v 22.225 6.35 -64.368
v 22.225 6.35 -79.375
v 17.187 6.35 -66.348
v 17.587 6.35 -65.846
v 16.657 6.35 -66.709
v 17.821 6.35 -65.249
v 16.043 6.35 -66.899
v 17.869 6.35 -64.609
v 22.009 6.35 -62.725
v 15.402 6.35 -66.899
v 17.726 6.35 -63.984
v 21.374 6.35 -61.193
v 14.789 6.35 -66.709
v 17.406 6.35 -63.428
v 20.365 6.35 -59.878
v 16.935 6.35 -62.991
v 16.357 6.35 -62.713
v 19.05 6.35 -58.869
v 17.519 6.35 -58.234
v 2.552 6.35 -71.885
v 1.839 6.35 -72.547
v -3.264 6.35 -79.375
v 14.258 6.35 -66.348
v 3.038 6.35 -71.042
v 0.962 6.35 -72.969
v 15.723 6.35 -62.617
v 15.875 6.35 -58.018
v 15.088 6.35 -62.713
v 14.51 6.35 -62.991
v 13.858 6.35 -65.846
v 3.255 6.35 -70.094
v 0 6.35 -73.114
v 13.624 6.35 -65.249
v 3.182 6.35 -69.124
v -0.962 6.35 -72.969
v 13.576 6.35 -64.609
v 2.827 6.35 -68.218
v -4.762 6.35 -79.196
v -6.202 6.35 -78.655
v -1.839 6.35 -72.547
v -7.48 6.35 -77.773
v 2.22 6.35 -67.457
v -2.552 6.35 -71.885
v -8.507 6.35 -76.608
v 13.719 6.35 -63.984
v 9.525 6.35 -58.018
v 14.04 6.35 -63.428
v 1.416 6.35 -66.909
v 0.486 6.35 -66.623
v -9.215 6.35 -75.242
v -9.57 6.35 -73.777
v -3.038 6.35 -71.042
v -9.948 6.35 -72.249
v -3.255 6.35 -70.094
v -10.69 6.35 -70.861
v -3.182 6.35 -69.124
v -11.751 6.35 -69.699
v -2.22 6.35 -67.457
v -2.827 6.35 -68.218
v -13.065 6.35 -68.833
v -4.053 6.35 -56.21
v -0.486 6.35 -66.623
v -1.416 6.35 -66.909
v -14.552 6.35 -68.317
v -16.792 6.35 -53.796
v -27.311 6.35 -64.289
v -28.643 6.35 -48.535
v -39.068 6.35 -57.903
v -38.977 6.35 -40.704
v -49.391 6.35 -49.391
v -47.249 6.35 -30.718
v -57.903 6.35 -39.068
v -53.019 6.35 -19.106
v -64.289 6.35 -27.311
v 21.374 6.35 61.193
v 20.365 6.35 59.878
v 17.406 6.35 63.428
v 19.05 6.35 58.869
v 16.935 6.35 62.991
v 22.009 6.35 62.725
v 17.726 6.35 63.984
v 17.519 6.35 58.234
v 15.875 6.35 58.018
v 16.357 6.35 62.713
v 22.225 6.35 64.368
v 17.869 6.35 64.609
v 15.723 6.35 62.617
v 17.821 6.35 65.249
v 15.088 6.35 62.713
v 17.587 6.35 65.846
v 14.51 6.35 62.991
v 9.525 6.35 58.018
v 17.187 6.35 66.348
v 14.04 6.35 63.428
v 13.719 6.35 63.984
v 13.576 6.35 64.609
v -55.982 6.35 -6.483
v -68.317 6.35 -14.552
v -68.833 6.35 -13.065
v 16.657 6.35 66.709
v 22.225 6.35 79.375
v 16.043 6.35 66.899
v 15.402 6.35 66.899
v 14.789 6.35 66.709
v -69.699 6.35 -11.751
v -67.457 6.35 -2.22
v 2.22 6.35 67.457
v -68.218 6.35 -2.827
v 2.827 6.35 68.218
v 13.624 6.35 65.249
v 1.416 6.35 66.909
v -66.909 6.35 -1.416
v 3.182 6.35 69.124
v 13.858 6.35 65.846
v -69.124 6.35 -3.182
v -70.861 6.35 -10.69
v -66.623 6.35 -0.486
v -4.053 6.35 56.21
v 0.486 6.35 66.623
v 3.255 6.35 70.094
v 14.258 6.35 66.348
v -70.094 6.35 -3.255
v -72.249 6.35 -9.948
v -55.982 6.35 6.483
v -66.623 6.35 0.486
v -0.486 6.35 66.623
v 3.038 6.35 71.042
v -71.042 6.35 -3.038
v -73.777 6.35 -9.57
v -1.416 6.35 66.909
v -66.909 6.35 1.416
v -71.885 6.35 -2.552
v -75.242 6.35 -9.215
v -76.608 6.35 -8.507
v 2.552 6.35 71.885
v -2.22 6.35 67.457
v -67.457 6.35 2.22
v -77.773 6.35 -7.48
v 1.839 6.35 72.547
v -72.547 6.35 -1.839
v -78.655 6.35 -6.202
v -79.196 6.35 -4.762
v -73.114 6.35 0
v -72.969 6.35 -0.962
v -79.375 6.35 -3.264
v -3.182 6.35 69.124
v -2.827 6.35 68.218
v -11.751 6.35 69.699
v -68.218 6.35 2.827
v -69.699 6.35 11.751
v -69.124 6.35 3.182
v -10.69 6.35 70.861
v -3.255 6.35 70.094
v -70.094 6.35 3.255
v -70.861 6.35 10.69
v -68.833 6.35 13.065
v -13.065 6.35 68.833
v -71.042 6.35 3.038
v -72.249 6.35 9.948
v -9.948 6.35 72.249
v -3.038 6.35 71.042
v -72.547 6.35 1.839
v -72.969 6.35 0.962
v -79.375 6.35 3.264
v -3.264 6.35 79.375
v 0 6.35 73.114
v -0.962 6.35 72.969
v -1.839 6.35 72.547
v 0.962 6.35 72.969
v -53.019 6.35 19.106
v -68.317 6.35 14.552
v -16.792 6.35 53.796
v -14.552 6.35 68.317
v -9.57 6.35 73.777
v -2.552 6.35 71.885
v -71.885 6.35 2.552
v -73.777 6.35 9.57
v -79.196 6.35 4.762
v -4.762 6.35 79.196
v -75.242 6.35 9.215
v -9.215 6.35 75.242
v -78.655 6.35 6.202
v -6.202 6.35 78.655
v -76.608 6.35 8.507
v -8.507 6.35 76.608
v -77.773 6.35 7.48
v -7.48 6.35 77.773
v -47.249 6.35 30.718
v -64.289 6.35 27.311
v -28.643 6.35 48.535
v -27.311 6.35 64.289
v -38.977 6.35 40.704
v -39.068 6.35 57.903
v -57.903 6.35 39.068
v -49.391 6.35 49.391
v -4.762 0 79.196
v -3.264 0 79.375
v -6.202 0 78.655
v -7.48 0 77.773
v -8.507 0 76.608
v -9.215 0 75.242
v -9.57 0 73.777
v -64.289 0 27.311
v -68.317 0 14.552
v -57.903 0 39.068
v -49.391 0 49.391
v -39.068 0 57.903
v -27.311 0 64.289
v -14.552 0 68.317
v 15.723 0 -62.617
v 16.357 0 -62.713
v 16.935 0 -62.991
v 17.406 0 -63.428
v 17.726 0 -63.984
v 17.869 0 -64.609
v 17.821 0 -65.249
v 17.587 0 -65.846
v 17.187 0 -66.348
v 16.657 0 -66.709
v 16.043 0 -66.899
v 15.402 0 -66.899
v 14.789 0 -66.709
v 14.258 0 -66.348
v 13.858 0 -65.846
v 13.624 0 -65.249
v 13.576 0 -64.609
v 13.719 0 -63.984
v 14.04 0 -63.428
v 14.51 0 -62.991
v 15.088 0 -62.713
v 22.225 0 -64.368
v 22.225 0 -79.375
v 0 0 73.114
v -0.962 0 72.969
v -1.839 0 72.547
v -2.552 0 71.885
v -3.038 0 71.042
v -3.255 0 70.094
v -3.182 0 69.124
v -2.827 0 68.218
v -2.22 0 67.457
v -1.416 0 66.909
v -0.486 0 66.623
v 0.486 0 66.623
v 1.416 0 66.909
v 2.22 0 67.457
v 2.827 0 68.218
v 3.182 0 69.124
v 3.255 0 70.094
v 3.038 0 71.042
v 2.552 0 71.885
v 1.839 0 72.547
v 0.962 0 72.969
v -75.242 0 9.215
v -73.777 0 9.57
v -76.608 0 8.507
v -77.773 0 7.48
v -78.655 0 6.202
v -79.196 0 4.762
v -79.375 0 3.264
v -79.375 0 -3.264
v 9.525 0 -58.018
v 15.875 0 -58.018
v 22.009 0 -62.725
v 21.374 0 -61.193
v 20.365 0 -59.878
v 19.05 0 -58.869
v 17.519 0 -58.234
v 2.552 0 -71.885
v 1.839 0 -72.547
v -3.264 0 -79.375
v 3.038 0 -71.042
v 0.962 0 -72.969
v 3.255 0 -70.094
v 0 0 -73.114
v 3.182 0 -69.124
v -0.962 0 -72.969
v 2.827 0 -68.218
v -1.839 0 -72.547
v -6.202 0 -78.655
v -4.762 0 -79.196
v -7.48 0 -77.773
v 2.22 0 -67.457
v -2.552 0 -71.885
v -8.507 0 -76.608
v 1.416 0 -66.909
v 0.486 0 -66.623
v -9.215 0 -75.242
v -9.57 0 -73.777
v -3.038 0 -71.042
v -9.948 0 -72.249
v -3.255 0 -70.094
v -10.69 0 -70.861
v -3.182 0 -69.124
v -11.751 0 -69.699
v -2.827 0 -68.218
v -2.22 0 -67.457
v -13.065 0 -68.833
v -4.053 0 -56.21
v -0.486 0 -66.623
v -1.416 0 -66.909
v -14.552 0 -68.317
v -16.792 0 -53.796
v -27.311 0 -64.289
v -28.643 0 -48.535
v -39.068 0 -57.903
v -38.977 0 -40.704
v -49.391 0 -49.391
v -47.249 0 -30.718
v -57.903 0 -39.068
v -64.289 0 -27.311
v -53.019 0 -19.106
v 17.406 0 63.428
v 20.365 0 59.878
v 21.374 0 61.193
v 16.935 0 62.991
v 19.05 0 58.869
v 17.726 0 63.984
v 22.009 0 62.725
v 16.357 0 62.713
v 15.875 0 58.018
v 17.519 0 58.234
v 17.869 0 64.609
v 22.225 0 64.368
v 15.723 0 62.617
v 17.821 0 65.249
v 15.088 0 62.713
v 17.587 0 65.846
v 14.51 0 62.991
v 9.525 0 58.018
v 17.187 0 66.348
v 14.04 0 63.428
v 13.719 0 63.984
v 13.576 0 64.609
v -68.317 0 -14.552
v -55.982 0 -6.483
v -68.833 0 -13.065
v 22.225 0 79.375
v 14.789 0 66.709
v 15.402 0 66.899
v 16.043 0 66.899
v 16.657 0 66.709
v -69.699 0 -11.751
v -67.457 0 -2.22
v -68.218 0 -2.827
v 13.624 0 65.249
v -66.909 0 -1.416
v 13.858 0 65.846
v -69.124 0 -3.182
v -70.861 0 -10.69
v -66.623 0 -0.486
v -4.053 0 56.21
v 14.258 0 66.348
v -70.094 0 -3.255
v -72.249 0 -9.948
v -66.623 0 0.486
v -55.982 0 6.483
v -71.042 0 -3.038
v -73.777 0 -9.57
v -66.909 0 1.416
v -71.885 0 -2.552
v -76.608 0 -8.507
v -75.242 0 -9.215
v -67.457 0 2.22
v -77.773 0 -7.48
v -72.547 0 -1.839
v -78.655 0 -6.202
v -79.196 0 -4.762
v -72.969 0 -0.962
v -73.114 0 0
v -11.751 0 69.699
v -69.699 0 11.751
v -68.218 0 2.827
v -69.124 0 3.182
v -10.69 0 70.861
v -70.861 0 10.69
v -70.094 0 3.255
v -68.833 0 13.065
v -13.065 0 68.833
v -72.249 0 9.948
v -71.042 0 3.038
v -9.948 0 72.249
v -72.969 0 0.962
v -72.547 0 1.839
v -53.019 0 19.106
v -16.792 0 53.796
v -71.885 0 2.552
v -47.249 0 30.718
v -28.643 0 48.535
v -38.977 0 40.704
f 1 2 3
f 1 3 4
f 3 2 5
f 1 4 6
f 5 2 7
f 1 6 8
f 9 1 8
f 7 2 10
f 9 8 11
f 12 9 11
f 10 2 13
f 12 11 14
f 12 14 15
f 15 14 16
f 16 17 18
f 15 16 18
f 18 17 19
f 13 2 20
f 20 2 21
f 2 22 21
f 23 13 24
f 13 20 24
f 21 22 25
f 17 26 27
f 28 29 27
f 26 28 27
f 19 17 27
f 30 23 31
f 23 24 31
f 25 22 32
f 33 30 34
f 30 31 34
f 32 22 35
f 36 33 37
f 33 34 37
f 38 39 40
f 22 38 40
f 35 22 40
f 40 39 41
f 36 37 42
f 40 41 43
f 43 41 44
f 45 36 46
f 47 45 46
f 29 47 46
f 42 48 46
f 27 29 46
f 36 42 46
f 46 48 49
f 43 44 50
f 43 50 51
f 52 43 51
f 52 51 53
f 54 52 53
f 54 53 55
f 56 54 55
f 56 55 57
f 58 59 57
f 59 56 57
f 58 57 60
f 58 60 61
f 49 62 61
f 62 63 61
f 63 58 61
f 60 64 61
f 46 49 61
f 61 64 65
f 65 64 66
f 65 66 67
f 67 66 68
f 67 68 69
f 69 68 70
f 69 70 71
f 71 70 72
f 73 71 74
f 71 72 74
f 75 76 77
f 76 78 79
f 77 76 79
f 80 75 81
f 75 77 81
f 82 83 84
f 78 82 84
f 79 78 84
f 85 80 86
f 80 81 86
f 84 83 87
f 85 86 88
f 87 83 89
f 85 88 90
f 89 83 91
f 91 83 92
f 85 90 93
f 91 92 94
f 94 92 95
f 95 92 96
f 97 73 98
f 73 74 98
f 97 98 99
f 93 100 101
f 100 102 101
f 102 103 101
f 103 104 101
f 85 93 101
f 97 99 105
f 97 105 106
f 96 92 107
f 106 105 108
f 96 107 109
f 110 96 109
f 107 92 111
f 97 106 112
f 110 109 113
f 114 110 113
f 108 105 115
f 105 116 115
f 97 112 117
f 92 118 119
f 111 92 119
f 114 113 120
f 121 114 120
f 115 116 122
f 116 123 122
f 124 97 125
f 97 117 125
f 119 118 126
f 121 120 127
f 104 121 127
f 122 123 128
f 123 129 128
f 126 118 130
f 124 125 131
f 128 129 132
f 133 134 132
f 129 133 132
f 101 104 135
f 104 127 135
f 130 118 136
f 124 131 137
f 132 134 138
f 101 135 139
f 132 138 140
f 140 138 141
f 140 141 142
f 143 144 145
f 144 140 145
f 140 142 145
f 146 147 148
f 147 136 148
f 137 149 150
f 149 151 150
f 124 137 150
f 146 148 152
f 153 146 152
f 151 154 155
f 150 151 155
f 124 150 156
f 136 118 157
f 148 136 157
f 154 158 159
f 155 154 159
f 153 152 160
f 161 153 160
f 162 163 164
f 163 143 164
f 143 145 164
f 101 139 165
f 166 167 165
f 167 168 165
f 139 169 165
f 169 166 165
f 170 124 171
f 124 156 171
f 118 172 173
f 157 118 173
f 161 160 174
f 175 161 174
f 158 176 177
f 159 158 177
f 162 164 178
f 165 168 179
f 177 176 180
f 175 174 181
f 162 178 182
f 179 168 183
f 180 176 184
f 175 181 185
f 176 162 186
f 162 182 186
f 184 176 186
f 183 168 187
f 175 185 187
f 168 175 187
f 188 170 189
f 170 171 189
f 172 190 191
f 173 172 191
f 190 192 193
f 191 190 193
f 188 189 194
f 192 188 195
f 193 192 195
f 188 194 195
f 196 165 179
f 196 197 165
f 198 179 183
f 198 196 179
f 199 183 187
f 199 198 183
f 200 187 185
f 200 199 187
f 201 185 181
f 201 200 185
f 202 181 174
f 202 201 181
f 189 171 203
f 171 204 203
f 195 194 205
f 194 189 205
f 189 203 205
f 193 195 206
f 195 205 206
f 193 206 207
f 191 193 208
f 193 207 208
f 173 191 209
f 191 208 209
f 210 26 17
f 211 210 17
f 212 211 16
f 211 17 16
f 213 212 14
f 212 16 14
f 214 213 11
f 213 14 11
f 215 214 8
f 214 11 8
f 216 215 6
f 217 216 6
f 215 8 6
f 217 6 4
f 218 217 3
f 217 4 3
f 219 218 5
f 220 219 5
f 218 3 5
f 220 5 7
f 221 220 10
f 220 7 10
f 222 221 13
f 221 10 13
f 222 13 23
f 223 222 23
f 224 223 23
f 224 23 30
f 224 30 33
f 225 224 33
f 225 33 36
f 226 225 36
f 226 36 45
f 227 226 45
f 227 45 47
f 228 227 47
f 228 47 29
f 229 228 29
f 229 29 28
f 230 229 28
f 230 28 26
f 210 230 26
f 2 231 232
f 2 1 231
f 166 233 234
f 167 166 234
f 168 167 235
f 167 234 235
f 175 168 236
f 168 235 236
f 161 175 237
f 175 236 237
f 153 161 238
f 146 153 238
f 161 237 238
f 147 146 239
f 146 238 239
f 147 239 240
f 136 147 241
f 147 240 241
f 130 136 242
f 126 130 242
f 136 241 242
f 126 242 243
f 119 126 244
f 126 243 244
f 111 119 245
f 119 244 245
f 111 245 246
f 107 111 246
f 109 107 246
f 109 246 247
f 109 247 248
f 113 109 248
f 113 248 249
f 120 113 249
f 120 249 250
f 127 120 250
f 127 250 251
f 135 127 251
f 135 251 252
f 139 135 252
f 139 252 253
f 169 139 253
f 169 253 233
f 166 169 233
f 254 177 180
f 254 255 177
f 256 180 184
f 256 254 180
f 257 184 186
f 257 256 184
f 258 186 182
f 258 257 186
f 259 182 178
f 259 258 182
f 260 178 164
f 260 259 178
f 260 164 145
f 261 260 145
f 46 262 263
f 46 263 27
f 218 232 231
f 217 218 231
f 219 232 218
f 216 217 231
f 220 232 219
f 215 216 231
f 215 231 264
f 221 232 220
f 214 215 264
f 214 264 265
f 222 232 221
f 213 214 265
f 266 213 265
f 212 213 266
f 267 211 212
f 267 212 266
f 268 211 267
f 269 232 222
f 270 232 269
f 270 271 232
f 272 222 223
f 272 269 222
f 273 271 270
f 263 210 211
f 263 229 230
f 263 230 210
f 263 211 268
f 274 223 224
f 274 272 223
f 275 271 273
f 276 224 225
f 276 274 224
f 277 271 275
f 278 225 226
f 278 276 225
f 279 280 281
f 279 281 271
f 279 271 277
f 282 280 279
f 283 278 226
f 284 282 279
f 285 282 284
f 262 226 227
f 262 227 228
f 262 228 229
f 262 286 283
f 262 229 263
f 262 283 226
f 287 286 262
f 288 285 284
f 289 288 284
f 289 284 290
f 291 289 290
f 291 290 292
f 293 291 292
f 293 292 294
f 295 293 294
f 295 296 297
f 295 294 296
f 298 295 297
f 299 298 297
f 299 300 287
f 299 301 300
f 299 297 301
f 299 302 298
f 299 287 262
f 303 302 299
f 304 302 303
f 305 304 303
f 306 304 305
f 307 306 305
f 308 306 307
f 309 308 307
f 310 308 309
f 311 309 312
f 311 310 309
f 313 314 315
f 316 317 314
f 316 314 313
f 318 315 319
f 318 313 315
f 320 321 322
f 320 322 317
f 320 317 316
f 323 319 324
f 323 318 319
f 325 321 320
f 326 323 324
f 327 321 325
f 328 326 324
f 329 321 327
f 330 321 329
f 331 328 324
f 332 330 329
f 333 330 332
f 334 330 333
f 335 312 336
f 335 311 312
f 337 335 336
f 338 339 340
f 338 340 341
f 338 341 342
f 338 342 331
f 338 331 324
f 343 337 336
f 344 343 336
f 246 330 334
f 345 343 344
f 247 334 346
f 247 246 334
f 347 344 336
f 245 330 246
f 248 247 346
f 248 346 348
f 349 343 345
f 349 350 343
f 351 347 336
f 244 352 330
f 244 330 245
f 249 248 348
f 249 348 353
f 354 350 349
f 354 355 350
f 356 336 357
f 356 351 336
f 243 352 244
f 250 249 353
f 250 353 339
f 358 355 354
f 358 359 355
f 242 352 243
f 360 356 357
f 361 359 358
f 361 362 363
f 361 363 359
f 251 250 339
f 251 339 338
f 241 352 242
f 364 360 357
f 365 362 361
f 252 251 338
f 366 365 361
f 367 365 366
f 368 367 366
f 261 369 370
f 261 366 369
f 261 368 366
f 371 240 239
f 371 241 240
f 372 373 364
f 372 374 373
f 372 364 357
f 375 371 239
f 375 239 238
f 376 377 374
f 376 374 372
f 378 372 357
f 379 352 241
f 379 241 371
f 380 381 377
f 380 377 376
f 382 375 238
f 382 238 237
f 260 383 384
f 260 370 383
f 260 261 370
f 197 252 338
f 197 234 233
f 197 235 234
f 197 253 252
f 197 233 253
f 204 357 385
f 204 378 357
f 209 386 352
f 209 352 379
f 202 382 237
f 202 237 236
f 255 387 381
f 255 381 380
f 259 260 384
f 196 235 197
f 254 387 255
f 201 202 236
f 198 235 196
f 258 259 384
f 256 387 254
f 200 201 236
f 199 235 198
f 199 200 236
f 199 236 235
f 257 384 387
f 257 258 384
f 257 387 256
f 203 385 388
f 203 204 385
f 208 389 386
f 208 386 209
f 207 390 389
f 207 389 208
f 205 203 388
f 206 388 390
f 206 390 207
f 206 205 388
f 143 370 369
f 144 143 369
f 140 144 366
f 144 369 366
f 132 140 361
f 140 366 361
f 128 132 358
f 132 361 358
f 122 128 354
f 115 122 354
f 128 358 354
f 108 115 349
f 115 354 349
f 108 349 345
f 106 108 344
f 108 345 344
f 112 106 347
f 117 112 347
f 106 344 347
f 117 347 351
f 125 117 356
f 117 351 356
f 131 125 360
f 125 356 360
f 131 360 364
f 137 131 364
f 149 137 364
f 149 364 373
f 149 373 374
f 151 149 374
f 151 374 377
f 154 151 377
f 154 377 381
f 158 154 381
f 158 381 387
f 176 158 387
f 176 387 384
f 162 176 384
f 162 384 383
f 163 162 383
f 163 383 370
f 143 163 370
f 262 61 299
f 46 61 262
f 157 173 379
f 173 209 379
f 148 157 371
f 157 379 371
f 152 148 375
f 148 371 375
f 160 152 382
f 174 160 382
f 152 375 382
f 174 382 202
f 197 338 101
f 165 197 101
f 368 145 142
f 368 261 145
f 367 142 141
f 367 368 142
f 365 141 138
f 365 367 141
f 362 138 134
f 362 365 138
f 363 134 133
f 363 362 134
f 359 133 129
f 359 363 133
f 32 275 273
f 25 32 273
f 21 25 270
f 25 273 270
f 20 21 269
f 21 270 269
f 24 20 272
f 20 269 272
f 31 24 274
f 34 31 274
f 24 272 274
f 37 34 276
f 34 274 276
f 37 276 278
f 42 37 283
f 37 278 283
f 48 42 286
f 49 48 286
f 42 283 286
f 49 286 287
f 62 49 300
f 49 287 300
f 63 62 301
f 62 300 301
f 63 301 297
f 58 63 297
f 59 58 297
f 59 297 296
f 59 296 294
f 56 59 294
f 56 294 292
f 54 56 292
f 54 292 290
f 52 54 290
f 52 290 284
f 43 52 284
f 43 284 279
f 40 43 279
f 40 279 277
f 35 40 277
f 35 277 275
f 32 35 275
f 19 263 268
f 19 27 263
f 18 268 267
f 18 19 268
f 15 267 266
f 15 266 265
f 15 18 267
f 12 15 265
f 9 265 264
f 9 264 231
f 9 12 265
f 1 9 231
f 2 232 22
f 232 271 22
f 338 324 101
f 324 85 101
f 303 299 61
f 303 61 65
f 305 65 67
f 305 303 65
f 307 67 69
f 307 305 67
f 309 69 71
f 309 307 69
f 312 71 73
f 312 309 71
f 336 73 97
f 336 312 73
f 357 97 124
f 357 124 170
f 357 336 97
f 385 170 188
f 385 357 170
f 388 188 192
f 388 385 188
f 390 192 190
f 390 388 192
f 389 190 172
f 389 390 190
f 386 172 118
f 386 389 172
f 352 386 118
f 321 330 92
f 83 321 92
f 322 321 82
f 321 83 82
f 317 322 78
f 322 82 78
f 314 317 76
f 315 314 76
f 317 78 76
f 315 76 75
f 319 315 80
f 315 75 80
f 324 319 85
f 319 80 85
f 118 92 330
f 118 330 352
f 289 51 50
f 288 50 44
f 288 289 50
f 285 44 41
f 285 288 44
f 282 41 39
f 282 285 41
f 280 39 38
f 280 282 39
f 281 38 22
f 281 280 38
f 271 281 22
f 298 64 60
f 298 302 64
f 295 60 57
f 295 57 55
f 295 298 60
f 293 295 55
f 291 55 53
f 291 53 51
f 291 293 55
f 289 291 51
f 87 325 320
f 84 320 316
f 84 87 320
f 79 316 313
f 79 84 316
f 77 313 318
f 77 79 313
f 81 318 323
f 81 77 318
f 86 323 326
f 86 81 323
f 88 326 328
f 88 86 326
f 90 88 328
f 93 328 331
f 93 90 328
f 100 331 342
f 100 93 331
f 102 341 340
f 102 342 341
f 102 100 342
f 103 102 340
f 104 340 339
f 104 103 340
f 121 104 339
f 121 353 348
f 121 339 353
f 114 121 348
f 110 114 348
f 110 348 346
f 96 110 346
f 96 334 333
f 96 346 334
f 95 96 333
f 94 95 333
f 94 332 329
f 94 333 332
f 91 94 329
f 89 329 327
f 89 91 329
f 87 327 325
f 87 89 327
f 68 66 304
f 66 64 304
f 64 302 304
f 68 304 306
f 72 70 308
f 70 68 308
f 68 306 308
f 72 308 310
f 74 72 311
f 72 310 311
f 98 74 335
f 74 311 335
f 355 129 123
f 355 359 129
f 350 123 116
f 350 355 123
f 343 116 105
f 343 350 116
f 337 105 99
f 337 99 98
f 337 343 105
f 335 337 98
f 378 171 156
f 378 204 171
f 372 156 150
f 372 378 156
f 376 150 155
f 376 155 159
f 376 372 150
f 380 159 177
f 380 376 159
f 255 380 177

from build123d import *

# Parameters (mm, degrees)
SKETCH1_R                = 69.85
SKETCH1_R_2              = 56.35625
BOSS_EXTRUDE1_DEPTH      = 6.35
SKETCH5_W                = 19.05
SKETCH5_H                = 15.875
BOSS_EXTRUDE2_DEPTH      = 6.35
FILLET1_R                = 6.35
CIRPATTERN2_COUNT        = 3
CIRPATTERN2_ANGLE        = 180
FILLET1_OF_CIRPATTERN2_R = 6.35
SKETCH11_R               = 3.2639
CUT_EXTRUDE2_DEPTH       = 113.432663181
CIRPATTERN3_COUNT        = 3
CIRPATTERN3_ANGLE        = 180
CUT_EXTRUDE4_DEPTH       = 113.432663181
FILLET8_R                = 6.35
SKETCH22_W               = 21.356989326
SKETCH22_H               = 6.35
BOSS_EXTRUDE3_DEPTH      = 12.7
SKETCH23_R               = 2.15265
CUT_EXTRUDE5_DEPTH       = 113.432663328
FILLET11_R               = 6.35


with BuildPart() as part:
    # Sketch1 → Boss-Extrude1 (new body)
    with BuildSketch(Plane(origin=(0, 0, 0), x_dir=(1, 0, 0), z_dir=(0, 1, 0))):
        with Locations(Location((0, 0, 0), (0, 0, 270))):
            Circle(SKETCH1_R)
        with Locations(Location((0, 0, 0), (0, 0, 270))):
            Circle(SKETCH1_R_2, mode=Mode.SUBTRACT)
    extrude(amount=BOSS_EXTRUDE1_DEPTH)

    # Sketch5 → Boss-Extrude2 (add)
    with BuildSketch(Plane(origin=(0, 6.35, 0), x_dir=(1, 0, 0), z_dir=(0, 1, 0))):
        with Locations((0, 71.4375)):
            Rectangle(SKETCH5_W, SKETCH5_H)
    boss_extrude2 = extrude(amount=-BOSS_EXTRUDE2_DEPTH)

    # Fillet1
    fillet1_edges = [part.edges().sort_by_distance(p)[0] for p in [
        (9.525, 3.175, -69.197520729),
        (-9.525, 3.175, -69.197520729),
    ]]
    fillet(fillet1_edges, radius=FILLET1_R)

    # CirPattern2: Boss-Extrude2 ×3 about axis
    cirpattern2_axis = Axis((0, 0, 0), (0, 1, 0))
    for i in range(1, CIRPATTERN2_COUNT):
        add(boss_extrude2.rotate(cirpattern2_axis, i * CIRPATTERN2_ANGLE / (CIRPATTERN2_COUNT - 1)))

    # Fillet1 of CirPattern2
    fillet1_of_cirpattern2_edges = [part.edges().sort_by_distance(p)[0] for p in [
        (-69.197520729, 3.175, -9.525),
        (-69.197520729, 3.175, 9.525),
        (-9.525, 3.175, 69.197520729),
        (9.525, 3.175, 69.197520729),
    ]]
    fillet(fillet1_of_cirpattern2_edges, radius=FILLET1_OF_CIRPATTERN2_R)

    # Sketch11 → Cut-Extrude2 (cut, through all)
    with BuildSketch(Plane.XZ):
        with Locations(Location((0, -69.85, 0), (0, 0, 270))):
            Circle(SKETCH11_R)
    cut_extrude2 = extrude(amount=-CUT_EXTRUDE2_DEPTH, mode=Mode.SUBTRACT)

    # CirPattern3: Cut-Extrude2 ×3 about axis
    cirpattern3_axis = Axis((0, 0, 0), (0, 1, 0))
    for i in range(1, CIRPATTERN3_COUNT):
        add(cut_extrude2.rotate(cirpattern3_axis, i * CIRPATTERN3_ANGLE / (CIRPATTERN3_COUNT - 1)), mode=Mode.SUBTRACT)

    # Sketch14 → Cut-Extrude4 (cut, through all)
    with BuildSketch(Plane(origin=(0, 6.35, 0), x_dir=(1, 0, 0), z_dir=(0, 1, 0))):
        Polygon((76.141203704, 74.528010674), (76.141203704, -74.528010674), (9.525, -74.528010674), (9.525, -58.018010674), (-10.795, -55.312700974), (-10.795, 55.312700974), (9.525, 58.018010674), (9.525, 74.528010674), align=None)
    extrude(amount=-CUT_EXTRUDE4_DEPTH, mode=Mode.SUBTRACT)

    # Fillet8
    fillet8_edges = [part.edges().sort_by_distance(p)[0] for p in [
        (-9.525, 3.175, 79.375),
        (-79.375, 3.175, 9.525),
        (-79.375, 3.175, -9.525),
        (-9.525, 3.175, -79.375),
    ]]
    fillet(fillet8_edges, radius=FILLET8_R)

    # Sketch22 → Boss-Extrude3 (add)
    with BuildSketch(Plane(origin=(9.525, 0, 0), x_dir=(0, 0, -1), z_dir=(1, 0, 0))):
        with Locations((68.696505337, 3.175)):
            Rectangle(SKETCH22_W, SKETCH22_H)
    boss_extrude3 = extrude(amount=BOSS_EXTRUDE3_DEPTH)

    # Sketch23 → Cut-Extrude5 (cut, through all)
    with BuildSketch(Plane(origin=(0, 6.35, 0), x_dir=(1, 0, 0), z_dir=(0, 1, 0))):
        with Locations(Location((15.7226, 64.77, 0), (0, 0, 270))):
            Circle(SKETCH23_R)
    cut_extrude5 = extrude(amount=-CUT_EXTRUDE5_DEPTH, mode=Mode.SUBTRACT)

    # Mirror1: Boss-Extrude3, Cut-Extrude5 across plane
    add(boss_extrude3.mirror(Plane.XY))
    add(cut_extrude5.mirror(Plane.XY), mode=Mode.SUBTRACT)

    # Fillet11
    fillet11_edges = [part.edges().sort_by_distance(p)[0] for p in [
        (22.225, 3.175, -58.018010674),
        (22.225, 3.175, 58.018010674),
    ]]
    fillet(fillet11_edges, radius=FILLET11_R)


solid = part.part
